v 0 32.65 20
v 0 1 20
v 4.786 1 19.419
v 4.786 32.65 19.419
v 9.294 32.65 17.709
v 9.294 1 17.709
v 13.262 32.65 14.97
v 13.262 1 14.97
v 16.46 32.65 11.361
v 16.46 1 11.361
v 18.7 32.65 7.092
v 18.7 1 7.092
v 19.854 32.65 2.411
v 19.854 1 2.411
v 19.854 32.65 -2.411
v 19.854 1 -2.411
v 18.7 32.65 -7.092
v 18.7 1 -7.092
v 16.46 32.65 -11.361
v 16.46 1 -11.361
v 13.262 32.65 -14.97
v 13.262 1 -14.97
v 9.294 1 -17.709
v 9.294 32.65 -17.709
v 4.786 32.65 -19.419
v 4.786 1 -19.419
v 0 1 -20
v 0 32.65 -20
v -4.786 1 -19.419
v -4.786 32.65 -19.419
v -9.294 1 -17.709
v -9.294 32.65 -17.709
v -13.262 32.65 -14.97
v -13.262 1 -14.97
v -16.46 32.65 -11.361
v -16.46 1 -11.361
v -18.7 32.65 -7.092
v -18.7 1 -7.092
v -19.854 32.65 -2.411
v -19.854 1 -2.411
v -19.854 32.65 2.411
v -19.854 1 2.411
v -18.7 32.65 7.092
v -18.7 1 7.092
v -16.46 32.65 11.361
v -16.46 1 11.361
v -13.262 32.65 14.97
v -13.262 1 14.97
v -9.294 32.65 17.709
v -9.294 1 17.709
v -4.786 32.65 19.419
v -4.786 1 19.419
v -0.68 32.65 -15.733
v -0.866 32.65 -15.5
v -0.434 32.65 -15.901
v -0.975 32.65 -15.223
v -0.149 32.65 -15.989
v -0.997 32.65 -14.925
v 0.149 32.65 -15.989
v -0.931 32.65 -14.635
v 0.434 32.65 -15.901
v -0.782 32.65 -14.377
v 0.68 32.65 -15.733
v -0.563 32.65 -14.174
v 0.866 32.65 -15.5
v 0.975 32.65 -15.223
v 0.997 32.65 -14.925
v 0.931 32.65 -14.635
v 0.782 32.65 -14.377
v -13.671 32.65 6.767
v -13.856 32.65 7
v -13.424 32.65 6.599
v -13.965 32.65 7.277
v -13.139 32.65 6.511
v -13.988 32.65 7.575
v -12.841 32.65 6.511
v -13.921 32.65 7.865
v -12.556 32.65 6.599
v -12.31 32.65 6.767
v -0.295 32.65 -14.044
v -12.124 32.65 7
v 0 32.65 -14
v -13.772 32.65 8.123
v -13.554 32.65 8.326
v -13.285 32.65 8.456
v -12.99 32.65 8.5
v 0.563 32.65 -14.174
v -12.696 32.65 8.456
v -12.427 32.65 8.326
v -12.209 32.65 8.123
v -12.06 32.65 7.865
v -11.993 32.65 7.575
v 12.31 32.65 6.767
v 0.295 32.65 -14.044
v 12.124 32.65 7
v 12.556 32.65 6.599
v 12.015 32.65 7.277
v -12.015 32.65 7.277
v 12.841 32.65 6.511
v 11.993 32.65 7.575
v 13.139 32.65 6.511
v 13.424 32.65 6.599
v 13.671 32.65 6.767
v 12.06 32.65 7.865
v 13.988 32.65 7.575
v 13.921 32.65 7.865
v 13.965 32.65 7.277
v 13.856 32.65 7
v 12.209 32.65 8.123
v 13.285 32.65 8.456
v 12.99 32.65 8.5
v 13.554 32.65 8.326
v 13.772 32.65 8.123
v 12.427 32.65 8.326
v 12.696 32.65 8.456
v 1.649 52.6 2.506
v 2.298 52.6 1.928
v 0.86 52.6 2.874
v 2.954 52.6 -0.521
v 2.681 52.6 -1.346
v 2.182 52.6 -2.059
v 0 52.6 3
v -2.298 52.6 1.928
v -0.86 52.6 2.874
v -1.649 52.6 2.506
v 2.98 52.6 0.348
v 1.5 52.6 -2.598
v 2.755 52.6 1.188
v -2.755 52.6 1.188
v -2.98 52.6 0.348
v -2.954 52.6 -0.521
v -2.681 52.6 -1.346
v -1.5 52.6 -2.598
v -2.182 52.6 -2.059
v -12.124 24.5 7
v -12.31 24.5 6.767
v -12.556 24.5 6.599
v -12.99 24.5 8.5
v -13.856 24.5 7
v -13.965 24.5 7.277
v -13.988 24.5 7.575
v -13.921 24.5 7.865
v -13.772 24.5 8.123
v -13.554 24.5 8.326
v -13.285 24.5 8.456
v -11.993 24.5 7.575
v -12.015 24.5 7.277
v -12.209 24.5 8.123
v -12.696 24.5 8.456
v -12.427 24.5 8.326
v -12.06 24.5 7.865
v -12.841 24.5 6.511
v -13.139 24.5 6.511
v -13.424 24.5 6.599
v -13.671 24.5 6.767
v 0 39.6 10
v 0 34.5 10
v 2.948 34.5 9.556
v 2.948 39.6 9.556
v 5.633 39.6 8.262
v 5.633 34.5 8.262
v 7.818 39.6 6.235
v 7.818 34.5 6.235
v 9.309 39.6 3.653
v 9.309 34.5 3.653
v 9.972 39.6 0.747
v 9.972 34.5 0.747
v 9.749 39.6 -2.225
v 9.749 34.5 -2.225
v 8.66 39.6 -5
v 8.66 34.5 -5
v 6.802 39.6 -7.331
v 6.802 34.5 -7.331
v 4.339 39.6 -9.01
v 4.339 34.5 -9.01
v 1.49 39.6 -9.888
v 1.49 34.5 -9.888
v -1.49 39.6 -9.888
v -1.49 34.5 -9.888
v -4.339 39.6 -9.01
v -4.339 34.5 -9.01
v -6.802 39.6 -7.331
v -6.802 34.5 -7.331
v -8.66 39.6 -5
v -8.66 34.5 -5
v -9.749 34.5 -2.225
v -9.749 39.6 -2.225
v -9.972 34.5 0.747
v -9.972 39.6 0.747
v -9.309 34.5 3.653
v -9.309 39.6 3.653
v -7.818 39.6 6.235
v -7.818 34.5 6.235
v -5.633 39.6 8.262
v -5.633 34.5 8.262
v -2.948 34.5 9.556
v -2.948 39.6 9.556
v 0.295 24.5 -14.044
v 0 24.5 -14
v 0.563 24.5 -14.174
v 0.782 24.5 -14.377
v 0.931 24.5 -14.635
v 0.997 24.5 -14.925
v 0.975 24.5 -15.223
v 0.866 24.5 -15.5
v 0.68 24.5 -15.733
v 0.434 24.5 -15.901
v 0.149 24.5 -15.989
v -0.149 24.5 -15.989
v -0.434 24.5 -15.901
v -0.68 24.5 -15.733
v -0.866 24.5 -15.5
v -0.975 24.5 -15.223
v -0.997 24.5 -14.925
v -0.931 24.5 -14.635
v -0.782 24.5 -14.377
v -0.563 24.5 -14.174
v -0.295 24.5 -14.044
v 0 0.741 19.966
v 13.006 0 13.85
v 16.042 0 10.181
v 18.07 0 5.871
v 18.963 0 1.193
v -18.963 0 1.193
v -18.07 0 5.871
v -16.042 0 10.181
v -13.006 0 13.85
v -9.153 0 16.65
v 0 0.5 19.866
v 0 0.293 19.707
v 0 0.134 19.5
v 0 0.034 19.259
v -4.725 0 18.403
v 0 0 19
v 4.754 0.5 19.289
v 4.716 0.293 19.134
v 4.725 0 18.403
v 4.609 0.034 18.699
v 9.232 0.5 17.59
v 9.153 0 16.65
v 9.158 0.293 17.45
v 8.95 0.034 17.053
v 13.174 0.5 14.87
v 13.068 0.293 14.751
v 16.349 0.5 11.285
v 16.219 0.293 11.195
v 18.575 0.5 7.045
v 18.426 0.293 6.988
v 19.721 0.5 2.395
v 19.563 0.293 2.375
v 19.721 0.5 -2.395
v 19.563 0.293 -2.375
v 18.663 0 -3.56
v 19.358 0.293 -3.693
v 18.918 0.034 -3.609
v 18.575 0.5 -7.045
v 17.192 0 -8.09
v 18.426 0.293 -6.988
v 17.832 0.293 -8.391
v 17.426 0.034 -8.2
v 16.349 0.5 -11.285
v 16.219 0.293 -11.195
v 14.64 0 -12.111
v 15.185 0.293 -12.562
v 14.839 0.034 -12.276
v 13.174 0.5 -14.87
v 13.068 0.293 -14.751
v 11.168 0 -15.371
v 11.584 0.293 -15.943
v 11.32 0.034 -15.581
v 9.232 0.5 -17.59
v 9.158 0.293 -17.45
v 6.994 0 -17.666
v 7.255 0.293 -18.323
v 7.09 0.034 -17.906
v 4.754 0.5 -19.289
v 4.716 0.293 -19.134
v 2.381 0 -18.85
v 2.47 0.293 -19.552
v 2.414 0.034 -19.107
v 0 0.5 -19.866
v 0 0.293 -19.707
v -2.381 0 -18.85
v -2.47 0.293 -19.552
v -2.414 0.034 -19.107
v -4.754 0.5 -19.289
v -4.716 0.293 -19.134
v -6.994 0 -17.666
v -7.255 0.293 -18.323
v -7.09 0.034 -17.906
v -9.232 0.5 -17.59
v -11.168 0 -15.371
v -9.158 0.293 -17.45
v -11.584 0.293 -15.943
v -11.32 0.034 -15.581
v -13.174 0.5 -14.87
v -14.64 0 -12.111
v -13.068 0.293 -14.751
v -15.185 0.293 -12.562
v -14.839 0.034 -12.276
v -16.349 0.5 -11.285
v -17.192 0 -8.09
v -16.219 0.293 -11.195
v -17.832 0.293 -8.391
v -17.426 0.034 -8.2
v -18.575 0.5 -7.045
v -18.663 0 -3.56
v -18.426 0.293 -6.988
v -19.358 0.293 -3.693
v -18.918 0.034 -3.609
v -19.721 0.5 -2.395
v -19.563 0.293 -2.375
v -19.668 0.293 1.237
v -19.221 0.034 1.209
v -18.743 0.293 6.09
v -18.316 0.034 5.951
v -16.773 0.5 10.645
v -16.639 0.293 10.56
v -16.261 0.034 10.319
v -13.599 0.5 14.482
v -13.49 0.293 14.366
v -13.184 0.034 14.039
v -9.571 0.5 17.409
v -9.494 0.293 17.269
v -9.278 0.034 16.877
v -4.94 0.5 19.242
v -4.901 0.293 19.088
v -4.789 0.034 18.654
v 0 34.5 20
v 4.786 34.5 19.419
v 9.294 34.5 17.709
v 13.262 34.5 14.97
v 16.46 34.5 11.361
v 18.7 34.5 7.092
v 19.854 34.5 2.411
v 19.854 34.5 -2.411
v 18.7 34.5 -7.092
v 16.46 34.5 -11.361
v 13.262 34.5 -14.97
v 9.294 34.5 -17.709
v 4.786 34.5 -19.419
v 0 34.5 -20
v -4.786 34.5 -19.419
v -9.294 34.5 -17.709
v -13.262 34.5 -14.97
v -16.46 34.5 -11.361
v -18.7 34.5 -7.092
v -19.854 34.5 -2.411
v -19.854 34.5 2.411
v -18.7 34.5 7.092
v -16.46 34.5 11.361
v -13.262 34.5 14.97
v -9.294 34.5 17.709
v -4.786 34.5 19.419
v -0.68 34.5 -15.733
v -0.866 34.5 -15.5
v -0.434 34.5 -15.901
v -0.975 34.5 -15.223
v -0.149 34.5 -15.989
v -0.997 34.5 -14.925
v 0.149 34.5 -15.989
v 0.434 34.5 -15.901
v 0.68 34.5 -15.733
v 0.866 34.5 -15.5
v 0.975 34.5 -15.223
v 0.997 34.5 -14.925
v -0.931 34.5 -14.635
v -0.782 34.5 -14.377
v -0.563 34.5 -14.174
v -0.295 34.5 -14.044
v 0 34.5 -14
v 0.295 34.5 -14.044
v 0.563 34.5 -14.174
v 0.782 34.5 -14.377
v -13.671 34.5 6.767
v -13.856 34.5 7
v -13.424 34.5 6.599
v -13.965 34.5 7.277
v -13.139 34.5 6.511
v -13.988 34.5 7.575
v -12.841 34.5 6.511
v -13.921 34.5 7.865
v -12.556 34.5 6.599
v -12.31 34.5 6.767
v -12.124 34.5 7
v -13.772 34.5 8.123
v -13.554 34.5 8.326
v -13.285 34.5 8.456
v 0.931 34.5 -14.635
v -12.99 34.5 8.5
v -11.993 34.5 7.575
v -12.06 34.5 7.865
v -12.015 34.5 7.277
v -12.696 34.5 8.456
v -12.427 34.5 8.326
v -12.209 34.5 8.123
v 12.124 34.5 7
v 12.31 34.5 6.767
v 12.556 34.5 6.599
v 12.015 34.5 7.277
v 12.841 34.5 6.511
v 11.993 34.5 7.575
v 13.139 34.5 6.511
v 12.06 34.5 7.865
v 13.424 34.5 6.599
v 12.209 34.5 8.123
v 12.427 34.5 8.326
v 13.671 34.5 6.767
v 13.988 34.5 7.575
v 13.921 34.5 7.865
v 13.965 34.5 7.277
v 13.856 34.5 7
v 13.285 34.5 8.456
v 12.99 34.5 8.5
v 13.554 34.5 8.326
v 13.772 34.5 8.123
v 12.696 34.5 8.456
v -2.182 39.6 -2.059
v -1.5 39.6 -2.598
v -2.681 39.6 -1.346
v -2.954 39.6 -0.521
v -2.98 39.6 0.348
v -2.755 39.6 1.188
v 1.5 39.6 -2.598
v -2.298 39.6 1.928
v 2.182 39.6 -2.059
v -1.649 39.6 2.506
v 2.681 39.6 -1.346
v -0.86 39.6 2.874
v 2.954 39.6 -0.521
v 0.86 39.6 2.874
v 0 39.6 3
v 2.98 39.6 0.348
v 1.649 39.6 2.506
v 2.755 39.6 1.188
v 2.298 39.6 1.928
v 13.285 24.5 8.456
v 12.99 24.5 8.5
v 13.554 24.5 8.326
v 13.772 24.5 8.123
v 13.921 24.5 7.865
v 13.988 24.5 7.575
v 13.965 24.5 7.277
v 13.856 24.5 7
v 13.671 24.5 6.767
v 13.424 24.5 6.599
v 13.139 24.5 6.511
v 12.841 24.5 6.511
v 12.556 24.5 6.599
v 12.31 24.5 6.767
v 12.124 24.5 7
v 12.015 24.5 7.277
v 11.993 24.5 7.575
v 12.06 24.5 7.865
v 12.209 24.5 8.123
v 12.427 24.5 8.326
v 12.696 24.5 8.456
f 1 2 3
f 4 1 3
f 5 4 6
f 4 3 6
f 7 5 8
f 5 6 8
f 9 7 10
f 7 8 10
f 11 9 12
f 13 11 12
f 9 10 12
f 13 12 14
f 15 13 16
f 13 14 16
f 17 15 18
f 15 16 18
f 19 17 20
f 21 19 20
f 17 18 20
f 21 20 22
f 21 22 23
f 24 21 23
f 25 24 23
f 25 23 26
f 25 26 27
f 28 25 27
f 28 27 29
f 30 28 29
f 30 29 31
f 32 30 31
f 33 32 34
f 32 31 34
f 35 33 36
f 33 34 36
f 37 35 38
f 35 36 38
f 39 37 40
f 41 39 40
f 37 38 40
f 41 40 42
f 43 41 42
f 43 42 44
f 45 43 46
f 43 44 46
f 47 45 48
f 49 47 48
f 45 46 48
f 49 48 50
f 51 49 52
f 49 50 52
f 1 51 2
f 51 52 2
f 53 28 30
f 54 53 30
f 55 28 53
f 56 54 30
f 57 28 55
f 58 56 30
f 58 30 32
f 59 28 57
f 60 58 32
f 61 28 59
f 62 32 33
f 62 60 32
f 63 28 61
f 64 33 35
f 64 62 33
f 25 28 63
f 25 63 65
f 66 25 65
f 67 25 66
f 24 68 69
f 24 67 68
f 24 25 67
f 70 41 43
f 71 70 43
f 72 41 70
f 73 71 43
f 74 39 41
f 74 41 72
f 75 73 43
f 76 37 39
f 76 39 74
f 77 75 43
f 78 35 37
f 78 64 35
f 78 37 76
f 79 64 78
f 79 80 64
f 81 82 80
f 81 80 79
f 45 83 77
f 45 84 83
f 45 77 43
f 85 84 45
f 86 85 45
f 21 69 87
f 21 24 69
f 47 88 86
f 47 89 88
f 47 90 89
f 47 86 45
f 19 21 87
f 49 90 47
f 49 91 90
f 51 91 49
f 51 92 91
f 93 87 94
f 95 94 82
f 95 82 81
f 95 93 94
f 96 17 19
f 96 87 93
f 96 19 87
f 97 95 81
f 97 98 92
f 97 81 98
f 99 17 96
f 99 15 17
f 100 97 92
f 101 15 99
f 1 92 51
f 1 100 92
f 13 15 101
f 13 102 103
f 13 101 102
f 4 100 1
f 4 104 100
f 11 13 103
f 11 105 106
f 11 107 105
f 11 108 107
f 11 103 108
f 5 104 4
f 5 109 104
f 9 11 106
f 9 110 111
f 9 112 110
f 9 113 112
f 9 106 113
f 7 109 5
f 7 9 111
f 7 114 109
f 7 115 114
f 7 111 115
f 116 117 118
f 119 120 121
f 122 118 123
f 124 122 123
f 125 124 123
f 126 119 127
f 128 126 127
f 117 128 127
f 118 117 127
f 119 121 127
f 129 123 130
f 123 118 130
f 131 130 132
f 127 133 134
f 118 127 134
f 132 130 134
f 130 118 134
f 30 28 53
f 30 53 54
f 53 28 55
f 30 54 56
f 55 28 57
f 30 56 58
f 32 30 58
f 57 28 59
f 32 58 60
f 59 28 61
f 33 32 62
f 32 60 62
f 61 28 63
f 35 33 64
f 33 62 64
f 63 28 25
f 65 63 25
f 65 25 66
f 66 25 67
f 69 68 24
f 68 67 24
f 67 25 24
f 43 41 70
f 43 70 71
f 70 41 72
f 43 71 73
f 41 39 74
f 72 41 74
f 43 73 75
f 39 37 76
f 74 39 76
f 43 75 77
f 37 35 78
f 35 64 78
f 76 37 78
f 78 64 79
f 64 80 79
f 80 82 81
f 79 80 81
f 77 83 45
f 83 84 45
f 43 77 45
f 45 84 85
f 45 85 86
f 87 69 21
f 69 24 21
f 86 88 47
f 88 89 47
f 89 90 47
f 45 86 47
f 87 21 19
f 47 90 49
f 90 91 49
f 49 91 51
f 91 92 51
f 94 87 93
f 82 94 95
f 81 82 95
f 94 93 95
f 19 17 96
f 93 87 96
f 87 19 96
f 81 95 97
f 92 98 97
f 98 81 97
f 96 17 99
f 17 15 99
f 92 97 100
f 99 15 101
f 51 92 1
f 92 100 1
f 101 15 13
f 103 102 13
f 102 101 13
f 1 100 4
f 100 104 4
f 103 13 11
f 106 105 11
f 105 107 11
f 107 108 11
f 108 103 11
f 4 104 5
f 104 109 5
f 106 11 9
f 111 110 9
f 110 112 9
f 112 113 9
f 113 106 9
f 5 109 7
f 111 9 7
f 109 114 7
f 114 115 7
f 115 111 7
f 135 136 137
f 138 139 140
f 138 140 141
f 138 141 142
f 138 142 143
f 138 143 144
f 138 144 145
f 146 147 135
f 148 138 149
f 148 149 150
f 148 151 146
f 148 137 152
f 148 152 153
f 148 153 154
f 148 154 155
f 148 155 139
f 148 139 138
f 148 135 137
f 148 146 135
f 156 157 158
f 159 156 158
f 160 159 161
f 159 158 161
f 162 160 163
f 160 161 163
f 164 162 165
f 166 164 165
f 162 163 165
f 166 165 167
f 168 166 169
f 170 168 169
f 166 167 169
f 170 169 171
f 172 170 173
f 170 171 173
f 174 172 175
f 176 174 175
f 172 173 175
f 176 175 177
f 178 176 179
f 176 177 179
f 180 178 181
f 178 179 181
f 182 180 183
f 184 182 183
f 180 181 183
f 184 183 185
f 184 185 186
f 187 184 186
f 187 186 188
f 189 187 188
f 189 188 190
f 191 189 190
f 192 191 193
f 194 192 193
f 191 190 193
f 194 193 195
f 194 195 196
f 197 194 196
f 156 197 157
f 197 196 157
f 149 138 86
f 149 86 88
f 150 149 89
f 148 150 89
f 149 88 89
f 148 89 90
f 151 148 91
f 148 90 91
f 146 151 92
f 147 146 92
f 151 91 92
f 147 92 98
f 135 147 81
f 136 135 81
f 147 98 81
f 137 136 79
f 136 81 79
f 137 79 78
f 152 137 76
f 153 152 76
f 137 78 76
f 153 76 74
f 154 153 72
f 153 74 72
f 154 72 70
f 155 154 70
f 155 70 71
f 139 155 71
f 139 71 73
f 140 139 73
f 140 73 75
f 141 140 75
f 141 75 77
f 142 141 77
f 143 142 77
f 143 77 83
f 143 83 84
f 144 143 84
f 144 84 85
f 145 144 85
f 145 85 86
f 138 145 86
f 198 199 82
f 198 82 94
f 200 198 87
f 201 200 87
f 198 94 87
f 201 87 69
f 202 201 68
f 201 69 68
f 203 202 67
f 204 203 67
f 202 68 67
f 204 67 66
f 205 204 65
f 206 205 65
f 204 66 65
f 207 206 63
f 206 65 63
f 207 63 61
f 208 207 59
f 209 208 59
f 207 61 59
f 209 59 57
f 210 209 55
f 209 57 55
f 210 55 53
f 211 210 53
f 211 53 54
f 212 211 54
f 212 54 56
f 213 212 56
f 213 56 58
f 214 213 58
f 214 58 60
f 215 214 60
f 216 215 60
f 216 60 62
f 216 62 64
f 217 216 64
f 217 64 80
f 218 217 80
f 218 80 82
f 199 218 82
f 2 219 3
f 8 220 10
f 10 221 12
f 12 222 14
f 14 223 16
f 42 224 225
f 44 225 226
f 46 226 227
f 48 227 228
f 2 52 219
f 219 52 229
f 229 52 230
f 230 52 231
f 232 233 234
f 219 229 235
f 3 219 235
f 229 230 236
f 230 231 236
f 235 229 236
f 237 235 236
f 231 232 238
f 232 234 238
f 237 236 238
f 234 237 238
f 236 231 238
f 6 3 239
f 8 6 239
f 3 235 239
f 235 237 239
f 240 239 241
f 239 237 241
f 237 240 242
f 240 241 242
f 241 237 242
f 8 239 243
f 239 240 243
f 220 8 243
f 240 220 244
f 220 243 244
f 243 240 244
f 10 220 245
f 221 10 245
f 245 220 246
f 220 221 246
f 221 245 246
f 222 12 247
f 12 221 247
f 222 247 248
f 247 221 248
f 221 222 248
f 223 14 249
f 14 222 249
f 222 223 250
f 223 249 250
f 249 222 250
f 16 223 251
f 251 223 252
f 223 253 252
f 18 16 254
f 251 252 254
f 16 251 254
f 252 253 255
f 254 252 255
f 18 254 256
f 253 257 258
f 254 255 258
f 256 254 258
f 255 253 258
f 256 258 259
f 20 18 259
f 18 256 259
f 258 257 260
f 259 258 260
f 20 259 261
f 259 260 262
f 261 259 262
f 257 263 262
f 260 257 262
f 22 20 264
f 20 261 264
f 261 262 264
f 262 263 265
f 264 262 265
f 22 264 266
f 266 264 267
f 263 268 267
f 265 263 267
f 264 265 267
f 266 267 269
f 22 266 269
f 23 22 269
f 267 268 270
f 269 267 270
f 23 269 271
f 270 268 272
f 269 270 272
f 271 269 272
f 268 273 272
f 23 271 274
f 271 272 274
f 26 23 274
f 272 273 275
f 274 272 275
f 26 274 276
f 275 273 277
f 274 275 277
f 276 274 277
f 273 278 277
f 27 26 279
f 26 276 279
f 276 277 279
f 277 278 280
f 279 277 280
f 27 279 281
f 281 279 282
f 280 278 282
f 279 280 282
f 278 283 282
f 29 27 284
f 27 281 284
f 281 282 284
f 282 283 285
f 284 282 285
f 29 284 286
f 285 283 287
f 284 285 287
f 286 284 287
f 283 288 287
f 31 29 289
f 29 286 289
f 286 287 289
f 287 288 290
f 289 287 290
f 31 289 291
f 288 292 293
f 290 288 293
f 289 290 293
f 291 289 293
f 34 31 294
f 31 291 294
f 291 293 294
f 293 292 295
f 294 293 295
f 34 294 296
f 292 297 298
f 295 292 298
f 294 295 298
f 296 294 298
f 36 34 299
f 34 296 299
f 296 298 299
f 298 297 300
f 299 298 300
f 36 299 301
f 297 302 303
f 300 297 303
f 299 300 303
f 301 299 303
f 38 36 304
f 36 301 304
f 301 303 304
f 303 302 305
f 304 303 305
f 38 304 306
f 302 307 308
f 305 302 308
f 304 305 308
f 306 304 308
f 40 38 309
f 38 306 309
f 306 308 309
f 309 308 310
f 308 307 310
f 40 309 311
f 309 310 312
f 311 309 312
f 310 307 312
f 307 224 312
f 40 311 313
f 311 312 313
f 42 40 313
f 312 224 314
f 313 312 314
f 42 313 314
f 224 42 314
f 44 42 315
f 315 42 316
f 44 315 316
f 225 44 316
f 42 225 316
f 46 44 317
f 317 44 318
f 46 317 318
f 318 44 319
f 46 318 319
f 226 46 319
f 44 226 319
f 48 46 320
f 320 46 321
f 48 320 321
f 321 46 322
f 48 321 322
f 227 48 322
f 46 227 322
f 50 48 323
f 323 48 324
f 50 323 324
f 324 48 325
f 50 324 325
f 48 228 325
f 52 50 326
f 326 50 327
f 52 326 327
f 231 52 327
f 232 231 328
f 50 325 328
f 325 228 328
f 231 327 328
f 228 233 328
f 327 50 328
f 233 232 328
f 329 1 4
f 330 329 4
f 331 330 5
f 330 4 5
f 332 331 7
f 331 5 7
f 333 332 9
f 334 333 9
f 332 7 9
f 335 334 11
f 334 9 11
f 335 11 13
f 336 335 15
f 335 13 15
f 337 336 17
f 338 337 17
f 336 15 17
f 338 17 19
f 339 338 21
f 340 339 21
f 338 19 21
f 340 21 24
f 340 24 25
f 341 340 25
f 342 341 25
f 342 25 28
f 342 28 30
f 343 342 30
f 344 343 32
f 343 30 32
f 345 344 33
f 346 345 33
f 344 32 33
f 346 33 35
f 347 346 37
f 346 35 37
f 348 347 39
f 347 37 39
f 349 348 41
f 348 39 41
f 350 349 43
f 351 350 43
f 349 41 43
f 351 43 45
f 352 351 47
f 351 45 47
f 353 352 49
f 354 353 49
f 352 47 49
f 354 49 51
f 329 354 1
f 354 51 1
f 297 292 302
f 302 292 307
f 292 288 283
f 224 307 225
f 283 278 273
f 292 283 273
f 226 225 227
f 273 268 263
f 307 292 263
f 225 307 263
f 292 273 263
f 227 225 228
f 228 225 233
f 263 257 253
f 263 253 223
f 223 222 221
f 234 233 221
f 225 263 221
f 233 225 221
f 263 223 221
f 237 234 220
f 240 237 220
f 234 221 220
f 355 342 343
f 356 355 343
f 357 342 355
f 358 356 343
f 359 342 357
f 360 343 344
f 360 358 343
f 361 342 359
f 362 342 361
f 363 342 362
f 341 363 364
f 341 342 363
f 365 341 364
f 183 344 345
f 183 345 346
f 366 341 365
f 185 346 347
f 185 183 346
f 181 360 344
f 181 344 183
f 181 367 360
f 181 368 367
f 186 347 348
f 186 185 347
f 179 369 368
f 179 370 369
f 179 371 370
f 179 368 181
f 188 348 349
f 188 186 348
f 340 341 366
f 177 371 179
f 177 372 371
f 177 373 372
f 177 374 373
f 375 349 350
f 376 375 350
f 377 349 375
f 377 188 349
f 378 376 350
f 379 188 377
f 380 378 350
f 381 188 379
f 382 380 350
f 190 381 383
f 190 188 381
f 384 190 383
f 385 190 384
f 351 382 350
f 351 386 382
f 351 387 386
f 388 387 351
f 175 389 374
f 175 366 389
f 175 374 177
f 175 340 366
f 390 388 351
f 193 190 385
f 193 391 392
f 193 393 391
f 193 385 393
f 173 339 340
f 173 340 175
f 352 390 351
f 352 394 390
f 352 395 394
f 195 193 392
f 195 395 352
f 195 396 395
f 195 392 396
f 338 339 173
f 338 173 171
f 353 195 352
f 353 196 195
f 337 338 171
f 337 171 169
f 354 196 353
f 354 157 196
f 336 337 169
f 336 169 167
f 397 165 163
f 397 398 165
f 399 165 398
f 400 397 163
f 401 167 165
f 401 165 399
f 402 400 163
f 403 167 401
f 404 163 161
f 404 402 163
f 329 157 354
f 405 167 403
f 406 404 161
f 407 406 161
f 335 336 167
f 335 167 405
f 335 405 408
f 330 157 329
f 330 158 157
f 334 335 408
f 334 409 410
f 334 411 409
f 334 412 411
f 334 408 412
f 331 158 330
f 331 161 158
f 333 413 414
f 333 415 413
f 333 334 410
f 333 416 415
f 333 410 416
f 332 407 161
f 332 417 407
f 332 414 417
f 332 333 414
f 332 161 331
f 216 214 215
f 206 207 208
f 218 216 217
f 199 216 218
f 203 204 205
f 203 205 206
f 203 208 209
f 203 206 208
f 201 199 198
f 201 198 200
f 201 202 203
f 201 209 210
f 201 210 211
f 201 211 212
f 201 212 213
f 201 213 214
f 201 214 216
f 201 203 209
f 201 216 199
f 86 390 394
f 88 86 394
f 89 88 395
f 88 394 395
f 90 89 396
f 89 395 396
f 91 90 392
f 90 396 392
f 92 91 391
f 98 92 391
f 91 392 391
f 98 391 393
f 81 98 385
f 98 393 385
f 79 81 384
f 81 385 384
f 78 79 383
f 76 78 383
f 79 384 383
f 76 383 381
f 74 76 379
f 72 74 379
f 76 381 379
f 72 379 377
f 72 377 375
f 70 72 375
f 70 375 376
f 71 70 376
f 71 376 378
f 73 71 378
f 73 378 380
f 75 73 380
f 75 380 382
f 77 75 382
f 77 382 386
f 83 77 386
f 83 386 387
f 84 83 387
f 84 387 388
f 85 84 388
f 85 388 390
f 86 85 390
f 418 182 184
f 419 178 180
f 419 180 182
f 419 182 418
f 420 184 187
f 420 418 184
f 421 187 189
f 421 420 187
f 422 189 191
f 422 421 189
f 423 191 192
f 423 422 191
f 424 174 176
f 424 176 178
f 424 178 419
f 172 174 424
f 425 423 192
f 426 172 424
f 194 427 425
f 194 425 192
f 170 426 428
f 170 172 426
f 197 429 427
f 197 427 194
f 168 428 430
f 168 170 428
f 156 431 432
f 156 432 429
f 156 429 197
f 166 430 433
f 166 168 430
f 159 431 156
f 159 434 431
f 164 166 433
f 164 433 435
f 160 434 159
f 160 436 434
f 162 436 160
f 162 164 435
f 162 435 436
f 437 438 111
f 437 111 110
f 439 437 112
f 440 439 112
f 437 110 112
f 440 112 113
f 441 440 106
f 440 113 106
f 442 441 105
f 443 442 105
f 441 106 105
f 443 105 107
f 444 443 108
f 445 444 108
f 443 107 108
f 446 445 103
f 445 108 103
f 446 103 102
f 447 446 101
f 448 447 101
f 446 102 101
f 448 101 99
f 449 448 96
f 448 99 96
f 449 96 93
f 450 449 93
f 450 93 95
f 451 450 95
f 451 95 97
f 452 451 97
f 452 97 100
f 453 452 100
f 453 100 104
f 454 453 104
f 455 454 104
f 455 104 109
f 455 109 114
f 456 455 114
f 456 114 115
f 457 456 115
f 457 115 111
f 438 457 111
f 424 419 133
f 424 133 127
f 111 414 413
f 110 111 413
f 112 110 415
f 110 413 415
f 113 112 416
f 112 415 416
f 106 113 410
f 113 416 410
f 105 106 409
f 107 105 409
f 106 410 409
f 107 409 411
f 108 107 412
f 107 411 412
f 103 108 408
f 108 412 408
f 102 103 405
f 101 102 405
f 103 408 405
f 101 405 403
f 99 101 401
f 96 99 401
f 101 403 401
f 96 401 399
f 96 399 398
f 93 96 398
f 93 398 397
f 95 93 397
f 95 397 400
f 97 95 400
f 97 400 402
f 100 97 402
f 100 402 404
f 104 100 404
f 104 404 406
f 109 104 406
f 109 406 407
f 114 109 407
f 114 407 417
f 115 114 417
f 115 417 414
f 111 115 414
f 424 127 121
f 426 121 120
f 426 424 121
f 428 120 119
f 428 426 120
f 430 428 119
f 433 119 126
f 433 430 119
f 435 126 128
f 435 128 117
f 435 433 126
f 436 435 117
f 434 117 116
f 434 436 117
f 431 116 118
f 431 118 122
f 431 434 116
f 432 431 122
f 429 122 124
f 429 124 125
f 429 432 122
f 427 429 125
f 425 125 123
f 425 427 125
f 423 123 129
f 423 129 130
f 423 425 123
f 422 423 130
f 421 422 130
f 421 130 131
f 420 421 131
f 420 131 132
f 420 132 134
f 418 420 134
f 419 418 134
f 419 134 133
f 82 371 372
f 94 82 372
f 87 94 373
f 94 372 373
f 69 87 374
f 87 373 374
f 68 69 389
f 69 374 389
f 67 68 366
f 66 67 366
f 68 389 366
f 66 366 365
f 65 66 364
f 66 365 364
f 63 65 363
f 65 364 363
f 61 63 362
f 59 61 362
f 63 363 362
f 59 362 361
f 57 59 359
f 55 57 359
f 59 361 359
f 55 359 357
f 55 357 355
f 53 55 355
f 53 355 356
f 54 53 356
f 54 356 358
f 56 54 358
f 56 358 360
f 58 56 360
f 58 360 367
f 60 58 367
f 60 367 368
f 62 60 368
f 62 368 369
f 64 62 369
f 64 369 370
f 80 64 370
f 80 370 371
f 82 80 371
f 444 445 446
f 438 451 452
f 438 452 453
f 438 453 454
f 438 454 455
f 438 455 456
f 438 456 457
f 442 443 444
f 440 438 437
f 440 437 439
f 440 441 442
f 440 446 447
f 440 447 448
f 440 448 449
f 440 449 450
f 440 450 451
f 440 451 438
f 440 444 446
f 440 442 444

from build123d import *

# Parameters (mm, degrees)
IZIM1_R                     = 20
Y_KSEKLIK_EKSTR_ZYON1_DEPTH = 32.65
IZIM2_R                     = 20
Y_KSEKLIK_EKSTR_ZYON2_DEPTH = 1.85
IZIM3_R                     = 10
Y_KSEKLIK_EKSTR_ZYON3_DEPTH = 5.1
IZIM4_R                     = 1
KES_EKSTR_ZYON1_DEPTH       = 10
RADYUS1_R                   = 1
Y_KSEKLIK_EKSTR_ZYON4_DEPTH = 13


with BuildPart() as part:
    # Çizim1 → Yükseklik-Ekstrüzyon1 (new body)
    with BuildSketch(Plane(origin=(0, 0, 0), x_dir=(1, 0, 0), z_dir=(0, 1, 0))):
        with Locations(Location((0, 0, 0), (0, 0, 270))):
            Circle(IZIM1_R)
    extrude(amount=Y_KSEKLIK_EKSTR_ZYON1_DEPTH)


with BuildPart() as body_2:
    # Çizim2 → Yükseklik-Ekstrüzyon2 (new body)
    with BuildSketch(Plane(origin=(0, 32.65, 0), x_dir=(1, 0, 0), z_dir=(0, 1, 0))):
        with Locations(Location((0, 0, 0), (0, 0, 270))):
            Circle(IZIM2_R)
    extrude(amount=Y_KSEKLIK_EKSTR_ZYON2_DEPTH)

    # Çizim3 → Yükseklik-Ekstrüzyon3 (add)
    with BuildSketch(Plane(origin=(0, 34.5, 0), x_dir=(1, 0, 0), z_dir=(0, 1, 0))):
        with Locations(Location((0, 0, 0), (0, 0, 270))):
            Circle(IZIM3_R)
    extrude(amount=Y_KSEKLIK_EKSTR_ZYON3_DEPTH)


with BuildPart() as kes_ekstr_zyon1_tool:
    # Çizim4 → Kes-Ekstrüzyon1 (new body)
    with BuildSketch(Plane(origin=(0, 34.5, 0), x_dir=(1, 0, 0), z_dir=(0, 1, 0))):
        with Locations(Location((0, 15, 0), (0, 0, 270))):
            Circle(IZIM4_R)
        with Locations(Location((12.990381057, -7.5, 0), (0, 0, 270))):
            Circle(IZIM4_R)
        with Locations(Location((-12.990381057, -7.5, 0), (0, 0, 270))):
            Circle(IZIM4_R)
    extrude(amount=-KES_EKSTR_ZYON1_DEPTH)


with BuildPart() as part_1:
    add(part.part)

    # Kes-Ekstrüzyon1: cut by kes_ekstr_zyon1_tool
    add(kes_ekstr_zyon1_tool.part, mode=Mode.SUBTRACT)

    # Radyus1
    radyus1_edges = [part_1.edges().sort_by_distance(p)[0] for p in [
        (0, 0, -20),
    ]]
    fillet(radyus1_edges, radius=RADYUS1_R)


with BuildPart() as body_2_1:
    add(body_2.part)

    # Kes-Ekstrüzyon1: cut by kes_ekstr_zyon1_tool
    add(kes_ekstr_zyon1_tool.part, mode=Mode.SUBTRACT)

    # Çizim5 → Yükseklik-Ekstrüzyon4 (add)
    with BuildSketch(Plane(origin=(0, 39.6, 0), x_dir=(1, 0, 0), z_dir=(0, 1, 0))):
        with BuildLine():
            Line((-1.5, 2.598076211), (1.5, 2.598076211))
            ThreePointArc((1.5, 2.598076211), (0, -3), (-1.5, 2.598076211))
        make_face()
    extrude(amount=Y_KSEKLIK_EKSTR_ZYON4_DEPTH)


solid = Compound([part_1.part, body_2_1.part])
